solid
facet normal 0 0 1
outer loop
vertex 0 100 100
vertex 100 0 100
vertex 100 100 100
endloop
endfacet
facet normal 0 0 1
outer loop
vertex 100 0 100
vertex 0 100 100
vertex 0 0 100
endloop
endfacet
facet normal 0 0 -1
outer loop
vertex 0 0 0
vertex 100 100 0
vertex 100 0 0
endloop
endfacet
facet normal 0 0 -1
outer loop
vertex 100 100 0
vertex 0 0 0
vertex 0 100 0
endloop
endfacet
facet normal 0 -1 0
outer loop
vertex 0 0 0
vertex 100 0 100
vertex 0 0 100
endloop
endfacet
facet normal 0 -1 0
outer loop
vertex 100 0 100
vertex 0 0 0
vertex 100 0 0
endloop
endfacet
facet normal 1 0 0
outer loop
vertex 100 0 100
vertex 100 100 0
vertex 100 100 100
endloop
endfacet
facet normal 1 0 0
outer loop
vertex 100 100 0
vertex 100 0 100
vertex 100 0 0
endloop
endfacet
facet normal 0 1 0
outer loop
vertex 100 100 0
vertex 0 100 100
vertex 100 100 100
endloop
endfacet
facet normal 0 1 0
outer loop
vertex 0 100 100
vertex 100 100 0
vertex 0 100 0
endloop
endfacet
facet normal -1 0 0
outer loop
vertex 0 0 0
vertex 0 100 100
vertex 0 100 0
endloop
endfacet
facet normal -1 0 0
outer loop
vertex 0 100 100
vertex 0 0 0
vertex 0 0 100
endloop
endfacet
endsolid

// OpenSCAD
// 100mmx100mmx100mm Cube.
// Example for slice.mk
edge = 100;
cube([edge, edge, edge],center=false);
